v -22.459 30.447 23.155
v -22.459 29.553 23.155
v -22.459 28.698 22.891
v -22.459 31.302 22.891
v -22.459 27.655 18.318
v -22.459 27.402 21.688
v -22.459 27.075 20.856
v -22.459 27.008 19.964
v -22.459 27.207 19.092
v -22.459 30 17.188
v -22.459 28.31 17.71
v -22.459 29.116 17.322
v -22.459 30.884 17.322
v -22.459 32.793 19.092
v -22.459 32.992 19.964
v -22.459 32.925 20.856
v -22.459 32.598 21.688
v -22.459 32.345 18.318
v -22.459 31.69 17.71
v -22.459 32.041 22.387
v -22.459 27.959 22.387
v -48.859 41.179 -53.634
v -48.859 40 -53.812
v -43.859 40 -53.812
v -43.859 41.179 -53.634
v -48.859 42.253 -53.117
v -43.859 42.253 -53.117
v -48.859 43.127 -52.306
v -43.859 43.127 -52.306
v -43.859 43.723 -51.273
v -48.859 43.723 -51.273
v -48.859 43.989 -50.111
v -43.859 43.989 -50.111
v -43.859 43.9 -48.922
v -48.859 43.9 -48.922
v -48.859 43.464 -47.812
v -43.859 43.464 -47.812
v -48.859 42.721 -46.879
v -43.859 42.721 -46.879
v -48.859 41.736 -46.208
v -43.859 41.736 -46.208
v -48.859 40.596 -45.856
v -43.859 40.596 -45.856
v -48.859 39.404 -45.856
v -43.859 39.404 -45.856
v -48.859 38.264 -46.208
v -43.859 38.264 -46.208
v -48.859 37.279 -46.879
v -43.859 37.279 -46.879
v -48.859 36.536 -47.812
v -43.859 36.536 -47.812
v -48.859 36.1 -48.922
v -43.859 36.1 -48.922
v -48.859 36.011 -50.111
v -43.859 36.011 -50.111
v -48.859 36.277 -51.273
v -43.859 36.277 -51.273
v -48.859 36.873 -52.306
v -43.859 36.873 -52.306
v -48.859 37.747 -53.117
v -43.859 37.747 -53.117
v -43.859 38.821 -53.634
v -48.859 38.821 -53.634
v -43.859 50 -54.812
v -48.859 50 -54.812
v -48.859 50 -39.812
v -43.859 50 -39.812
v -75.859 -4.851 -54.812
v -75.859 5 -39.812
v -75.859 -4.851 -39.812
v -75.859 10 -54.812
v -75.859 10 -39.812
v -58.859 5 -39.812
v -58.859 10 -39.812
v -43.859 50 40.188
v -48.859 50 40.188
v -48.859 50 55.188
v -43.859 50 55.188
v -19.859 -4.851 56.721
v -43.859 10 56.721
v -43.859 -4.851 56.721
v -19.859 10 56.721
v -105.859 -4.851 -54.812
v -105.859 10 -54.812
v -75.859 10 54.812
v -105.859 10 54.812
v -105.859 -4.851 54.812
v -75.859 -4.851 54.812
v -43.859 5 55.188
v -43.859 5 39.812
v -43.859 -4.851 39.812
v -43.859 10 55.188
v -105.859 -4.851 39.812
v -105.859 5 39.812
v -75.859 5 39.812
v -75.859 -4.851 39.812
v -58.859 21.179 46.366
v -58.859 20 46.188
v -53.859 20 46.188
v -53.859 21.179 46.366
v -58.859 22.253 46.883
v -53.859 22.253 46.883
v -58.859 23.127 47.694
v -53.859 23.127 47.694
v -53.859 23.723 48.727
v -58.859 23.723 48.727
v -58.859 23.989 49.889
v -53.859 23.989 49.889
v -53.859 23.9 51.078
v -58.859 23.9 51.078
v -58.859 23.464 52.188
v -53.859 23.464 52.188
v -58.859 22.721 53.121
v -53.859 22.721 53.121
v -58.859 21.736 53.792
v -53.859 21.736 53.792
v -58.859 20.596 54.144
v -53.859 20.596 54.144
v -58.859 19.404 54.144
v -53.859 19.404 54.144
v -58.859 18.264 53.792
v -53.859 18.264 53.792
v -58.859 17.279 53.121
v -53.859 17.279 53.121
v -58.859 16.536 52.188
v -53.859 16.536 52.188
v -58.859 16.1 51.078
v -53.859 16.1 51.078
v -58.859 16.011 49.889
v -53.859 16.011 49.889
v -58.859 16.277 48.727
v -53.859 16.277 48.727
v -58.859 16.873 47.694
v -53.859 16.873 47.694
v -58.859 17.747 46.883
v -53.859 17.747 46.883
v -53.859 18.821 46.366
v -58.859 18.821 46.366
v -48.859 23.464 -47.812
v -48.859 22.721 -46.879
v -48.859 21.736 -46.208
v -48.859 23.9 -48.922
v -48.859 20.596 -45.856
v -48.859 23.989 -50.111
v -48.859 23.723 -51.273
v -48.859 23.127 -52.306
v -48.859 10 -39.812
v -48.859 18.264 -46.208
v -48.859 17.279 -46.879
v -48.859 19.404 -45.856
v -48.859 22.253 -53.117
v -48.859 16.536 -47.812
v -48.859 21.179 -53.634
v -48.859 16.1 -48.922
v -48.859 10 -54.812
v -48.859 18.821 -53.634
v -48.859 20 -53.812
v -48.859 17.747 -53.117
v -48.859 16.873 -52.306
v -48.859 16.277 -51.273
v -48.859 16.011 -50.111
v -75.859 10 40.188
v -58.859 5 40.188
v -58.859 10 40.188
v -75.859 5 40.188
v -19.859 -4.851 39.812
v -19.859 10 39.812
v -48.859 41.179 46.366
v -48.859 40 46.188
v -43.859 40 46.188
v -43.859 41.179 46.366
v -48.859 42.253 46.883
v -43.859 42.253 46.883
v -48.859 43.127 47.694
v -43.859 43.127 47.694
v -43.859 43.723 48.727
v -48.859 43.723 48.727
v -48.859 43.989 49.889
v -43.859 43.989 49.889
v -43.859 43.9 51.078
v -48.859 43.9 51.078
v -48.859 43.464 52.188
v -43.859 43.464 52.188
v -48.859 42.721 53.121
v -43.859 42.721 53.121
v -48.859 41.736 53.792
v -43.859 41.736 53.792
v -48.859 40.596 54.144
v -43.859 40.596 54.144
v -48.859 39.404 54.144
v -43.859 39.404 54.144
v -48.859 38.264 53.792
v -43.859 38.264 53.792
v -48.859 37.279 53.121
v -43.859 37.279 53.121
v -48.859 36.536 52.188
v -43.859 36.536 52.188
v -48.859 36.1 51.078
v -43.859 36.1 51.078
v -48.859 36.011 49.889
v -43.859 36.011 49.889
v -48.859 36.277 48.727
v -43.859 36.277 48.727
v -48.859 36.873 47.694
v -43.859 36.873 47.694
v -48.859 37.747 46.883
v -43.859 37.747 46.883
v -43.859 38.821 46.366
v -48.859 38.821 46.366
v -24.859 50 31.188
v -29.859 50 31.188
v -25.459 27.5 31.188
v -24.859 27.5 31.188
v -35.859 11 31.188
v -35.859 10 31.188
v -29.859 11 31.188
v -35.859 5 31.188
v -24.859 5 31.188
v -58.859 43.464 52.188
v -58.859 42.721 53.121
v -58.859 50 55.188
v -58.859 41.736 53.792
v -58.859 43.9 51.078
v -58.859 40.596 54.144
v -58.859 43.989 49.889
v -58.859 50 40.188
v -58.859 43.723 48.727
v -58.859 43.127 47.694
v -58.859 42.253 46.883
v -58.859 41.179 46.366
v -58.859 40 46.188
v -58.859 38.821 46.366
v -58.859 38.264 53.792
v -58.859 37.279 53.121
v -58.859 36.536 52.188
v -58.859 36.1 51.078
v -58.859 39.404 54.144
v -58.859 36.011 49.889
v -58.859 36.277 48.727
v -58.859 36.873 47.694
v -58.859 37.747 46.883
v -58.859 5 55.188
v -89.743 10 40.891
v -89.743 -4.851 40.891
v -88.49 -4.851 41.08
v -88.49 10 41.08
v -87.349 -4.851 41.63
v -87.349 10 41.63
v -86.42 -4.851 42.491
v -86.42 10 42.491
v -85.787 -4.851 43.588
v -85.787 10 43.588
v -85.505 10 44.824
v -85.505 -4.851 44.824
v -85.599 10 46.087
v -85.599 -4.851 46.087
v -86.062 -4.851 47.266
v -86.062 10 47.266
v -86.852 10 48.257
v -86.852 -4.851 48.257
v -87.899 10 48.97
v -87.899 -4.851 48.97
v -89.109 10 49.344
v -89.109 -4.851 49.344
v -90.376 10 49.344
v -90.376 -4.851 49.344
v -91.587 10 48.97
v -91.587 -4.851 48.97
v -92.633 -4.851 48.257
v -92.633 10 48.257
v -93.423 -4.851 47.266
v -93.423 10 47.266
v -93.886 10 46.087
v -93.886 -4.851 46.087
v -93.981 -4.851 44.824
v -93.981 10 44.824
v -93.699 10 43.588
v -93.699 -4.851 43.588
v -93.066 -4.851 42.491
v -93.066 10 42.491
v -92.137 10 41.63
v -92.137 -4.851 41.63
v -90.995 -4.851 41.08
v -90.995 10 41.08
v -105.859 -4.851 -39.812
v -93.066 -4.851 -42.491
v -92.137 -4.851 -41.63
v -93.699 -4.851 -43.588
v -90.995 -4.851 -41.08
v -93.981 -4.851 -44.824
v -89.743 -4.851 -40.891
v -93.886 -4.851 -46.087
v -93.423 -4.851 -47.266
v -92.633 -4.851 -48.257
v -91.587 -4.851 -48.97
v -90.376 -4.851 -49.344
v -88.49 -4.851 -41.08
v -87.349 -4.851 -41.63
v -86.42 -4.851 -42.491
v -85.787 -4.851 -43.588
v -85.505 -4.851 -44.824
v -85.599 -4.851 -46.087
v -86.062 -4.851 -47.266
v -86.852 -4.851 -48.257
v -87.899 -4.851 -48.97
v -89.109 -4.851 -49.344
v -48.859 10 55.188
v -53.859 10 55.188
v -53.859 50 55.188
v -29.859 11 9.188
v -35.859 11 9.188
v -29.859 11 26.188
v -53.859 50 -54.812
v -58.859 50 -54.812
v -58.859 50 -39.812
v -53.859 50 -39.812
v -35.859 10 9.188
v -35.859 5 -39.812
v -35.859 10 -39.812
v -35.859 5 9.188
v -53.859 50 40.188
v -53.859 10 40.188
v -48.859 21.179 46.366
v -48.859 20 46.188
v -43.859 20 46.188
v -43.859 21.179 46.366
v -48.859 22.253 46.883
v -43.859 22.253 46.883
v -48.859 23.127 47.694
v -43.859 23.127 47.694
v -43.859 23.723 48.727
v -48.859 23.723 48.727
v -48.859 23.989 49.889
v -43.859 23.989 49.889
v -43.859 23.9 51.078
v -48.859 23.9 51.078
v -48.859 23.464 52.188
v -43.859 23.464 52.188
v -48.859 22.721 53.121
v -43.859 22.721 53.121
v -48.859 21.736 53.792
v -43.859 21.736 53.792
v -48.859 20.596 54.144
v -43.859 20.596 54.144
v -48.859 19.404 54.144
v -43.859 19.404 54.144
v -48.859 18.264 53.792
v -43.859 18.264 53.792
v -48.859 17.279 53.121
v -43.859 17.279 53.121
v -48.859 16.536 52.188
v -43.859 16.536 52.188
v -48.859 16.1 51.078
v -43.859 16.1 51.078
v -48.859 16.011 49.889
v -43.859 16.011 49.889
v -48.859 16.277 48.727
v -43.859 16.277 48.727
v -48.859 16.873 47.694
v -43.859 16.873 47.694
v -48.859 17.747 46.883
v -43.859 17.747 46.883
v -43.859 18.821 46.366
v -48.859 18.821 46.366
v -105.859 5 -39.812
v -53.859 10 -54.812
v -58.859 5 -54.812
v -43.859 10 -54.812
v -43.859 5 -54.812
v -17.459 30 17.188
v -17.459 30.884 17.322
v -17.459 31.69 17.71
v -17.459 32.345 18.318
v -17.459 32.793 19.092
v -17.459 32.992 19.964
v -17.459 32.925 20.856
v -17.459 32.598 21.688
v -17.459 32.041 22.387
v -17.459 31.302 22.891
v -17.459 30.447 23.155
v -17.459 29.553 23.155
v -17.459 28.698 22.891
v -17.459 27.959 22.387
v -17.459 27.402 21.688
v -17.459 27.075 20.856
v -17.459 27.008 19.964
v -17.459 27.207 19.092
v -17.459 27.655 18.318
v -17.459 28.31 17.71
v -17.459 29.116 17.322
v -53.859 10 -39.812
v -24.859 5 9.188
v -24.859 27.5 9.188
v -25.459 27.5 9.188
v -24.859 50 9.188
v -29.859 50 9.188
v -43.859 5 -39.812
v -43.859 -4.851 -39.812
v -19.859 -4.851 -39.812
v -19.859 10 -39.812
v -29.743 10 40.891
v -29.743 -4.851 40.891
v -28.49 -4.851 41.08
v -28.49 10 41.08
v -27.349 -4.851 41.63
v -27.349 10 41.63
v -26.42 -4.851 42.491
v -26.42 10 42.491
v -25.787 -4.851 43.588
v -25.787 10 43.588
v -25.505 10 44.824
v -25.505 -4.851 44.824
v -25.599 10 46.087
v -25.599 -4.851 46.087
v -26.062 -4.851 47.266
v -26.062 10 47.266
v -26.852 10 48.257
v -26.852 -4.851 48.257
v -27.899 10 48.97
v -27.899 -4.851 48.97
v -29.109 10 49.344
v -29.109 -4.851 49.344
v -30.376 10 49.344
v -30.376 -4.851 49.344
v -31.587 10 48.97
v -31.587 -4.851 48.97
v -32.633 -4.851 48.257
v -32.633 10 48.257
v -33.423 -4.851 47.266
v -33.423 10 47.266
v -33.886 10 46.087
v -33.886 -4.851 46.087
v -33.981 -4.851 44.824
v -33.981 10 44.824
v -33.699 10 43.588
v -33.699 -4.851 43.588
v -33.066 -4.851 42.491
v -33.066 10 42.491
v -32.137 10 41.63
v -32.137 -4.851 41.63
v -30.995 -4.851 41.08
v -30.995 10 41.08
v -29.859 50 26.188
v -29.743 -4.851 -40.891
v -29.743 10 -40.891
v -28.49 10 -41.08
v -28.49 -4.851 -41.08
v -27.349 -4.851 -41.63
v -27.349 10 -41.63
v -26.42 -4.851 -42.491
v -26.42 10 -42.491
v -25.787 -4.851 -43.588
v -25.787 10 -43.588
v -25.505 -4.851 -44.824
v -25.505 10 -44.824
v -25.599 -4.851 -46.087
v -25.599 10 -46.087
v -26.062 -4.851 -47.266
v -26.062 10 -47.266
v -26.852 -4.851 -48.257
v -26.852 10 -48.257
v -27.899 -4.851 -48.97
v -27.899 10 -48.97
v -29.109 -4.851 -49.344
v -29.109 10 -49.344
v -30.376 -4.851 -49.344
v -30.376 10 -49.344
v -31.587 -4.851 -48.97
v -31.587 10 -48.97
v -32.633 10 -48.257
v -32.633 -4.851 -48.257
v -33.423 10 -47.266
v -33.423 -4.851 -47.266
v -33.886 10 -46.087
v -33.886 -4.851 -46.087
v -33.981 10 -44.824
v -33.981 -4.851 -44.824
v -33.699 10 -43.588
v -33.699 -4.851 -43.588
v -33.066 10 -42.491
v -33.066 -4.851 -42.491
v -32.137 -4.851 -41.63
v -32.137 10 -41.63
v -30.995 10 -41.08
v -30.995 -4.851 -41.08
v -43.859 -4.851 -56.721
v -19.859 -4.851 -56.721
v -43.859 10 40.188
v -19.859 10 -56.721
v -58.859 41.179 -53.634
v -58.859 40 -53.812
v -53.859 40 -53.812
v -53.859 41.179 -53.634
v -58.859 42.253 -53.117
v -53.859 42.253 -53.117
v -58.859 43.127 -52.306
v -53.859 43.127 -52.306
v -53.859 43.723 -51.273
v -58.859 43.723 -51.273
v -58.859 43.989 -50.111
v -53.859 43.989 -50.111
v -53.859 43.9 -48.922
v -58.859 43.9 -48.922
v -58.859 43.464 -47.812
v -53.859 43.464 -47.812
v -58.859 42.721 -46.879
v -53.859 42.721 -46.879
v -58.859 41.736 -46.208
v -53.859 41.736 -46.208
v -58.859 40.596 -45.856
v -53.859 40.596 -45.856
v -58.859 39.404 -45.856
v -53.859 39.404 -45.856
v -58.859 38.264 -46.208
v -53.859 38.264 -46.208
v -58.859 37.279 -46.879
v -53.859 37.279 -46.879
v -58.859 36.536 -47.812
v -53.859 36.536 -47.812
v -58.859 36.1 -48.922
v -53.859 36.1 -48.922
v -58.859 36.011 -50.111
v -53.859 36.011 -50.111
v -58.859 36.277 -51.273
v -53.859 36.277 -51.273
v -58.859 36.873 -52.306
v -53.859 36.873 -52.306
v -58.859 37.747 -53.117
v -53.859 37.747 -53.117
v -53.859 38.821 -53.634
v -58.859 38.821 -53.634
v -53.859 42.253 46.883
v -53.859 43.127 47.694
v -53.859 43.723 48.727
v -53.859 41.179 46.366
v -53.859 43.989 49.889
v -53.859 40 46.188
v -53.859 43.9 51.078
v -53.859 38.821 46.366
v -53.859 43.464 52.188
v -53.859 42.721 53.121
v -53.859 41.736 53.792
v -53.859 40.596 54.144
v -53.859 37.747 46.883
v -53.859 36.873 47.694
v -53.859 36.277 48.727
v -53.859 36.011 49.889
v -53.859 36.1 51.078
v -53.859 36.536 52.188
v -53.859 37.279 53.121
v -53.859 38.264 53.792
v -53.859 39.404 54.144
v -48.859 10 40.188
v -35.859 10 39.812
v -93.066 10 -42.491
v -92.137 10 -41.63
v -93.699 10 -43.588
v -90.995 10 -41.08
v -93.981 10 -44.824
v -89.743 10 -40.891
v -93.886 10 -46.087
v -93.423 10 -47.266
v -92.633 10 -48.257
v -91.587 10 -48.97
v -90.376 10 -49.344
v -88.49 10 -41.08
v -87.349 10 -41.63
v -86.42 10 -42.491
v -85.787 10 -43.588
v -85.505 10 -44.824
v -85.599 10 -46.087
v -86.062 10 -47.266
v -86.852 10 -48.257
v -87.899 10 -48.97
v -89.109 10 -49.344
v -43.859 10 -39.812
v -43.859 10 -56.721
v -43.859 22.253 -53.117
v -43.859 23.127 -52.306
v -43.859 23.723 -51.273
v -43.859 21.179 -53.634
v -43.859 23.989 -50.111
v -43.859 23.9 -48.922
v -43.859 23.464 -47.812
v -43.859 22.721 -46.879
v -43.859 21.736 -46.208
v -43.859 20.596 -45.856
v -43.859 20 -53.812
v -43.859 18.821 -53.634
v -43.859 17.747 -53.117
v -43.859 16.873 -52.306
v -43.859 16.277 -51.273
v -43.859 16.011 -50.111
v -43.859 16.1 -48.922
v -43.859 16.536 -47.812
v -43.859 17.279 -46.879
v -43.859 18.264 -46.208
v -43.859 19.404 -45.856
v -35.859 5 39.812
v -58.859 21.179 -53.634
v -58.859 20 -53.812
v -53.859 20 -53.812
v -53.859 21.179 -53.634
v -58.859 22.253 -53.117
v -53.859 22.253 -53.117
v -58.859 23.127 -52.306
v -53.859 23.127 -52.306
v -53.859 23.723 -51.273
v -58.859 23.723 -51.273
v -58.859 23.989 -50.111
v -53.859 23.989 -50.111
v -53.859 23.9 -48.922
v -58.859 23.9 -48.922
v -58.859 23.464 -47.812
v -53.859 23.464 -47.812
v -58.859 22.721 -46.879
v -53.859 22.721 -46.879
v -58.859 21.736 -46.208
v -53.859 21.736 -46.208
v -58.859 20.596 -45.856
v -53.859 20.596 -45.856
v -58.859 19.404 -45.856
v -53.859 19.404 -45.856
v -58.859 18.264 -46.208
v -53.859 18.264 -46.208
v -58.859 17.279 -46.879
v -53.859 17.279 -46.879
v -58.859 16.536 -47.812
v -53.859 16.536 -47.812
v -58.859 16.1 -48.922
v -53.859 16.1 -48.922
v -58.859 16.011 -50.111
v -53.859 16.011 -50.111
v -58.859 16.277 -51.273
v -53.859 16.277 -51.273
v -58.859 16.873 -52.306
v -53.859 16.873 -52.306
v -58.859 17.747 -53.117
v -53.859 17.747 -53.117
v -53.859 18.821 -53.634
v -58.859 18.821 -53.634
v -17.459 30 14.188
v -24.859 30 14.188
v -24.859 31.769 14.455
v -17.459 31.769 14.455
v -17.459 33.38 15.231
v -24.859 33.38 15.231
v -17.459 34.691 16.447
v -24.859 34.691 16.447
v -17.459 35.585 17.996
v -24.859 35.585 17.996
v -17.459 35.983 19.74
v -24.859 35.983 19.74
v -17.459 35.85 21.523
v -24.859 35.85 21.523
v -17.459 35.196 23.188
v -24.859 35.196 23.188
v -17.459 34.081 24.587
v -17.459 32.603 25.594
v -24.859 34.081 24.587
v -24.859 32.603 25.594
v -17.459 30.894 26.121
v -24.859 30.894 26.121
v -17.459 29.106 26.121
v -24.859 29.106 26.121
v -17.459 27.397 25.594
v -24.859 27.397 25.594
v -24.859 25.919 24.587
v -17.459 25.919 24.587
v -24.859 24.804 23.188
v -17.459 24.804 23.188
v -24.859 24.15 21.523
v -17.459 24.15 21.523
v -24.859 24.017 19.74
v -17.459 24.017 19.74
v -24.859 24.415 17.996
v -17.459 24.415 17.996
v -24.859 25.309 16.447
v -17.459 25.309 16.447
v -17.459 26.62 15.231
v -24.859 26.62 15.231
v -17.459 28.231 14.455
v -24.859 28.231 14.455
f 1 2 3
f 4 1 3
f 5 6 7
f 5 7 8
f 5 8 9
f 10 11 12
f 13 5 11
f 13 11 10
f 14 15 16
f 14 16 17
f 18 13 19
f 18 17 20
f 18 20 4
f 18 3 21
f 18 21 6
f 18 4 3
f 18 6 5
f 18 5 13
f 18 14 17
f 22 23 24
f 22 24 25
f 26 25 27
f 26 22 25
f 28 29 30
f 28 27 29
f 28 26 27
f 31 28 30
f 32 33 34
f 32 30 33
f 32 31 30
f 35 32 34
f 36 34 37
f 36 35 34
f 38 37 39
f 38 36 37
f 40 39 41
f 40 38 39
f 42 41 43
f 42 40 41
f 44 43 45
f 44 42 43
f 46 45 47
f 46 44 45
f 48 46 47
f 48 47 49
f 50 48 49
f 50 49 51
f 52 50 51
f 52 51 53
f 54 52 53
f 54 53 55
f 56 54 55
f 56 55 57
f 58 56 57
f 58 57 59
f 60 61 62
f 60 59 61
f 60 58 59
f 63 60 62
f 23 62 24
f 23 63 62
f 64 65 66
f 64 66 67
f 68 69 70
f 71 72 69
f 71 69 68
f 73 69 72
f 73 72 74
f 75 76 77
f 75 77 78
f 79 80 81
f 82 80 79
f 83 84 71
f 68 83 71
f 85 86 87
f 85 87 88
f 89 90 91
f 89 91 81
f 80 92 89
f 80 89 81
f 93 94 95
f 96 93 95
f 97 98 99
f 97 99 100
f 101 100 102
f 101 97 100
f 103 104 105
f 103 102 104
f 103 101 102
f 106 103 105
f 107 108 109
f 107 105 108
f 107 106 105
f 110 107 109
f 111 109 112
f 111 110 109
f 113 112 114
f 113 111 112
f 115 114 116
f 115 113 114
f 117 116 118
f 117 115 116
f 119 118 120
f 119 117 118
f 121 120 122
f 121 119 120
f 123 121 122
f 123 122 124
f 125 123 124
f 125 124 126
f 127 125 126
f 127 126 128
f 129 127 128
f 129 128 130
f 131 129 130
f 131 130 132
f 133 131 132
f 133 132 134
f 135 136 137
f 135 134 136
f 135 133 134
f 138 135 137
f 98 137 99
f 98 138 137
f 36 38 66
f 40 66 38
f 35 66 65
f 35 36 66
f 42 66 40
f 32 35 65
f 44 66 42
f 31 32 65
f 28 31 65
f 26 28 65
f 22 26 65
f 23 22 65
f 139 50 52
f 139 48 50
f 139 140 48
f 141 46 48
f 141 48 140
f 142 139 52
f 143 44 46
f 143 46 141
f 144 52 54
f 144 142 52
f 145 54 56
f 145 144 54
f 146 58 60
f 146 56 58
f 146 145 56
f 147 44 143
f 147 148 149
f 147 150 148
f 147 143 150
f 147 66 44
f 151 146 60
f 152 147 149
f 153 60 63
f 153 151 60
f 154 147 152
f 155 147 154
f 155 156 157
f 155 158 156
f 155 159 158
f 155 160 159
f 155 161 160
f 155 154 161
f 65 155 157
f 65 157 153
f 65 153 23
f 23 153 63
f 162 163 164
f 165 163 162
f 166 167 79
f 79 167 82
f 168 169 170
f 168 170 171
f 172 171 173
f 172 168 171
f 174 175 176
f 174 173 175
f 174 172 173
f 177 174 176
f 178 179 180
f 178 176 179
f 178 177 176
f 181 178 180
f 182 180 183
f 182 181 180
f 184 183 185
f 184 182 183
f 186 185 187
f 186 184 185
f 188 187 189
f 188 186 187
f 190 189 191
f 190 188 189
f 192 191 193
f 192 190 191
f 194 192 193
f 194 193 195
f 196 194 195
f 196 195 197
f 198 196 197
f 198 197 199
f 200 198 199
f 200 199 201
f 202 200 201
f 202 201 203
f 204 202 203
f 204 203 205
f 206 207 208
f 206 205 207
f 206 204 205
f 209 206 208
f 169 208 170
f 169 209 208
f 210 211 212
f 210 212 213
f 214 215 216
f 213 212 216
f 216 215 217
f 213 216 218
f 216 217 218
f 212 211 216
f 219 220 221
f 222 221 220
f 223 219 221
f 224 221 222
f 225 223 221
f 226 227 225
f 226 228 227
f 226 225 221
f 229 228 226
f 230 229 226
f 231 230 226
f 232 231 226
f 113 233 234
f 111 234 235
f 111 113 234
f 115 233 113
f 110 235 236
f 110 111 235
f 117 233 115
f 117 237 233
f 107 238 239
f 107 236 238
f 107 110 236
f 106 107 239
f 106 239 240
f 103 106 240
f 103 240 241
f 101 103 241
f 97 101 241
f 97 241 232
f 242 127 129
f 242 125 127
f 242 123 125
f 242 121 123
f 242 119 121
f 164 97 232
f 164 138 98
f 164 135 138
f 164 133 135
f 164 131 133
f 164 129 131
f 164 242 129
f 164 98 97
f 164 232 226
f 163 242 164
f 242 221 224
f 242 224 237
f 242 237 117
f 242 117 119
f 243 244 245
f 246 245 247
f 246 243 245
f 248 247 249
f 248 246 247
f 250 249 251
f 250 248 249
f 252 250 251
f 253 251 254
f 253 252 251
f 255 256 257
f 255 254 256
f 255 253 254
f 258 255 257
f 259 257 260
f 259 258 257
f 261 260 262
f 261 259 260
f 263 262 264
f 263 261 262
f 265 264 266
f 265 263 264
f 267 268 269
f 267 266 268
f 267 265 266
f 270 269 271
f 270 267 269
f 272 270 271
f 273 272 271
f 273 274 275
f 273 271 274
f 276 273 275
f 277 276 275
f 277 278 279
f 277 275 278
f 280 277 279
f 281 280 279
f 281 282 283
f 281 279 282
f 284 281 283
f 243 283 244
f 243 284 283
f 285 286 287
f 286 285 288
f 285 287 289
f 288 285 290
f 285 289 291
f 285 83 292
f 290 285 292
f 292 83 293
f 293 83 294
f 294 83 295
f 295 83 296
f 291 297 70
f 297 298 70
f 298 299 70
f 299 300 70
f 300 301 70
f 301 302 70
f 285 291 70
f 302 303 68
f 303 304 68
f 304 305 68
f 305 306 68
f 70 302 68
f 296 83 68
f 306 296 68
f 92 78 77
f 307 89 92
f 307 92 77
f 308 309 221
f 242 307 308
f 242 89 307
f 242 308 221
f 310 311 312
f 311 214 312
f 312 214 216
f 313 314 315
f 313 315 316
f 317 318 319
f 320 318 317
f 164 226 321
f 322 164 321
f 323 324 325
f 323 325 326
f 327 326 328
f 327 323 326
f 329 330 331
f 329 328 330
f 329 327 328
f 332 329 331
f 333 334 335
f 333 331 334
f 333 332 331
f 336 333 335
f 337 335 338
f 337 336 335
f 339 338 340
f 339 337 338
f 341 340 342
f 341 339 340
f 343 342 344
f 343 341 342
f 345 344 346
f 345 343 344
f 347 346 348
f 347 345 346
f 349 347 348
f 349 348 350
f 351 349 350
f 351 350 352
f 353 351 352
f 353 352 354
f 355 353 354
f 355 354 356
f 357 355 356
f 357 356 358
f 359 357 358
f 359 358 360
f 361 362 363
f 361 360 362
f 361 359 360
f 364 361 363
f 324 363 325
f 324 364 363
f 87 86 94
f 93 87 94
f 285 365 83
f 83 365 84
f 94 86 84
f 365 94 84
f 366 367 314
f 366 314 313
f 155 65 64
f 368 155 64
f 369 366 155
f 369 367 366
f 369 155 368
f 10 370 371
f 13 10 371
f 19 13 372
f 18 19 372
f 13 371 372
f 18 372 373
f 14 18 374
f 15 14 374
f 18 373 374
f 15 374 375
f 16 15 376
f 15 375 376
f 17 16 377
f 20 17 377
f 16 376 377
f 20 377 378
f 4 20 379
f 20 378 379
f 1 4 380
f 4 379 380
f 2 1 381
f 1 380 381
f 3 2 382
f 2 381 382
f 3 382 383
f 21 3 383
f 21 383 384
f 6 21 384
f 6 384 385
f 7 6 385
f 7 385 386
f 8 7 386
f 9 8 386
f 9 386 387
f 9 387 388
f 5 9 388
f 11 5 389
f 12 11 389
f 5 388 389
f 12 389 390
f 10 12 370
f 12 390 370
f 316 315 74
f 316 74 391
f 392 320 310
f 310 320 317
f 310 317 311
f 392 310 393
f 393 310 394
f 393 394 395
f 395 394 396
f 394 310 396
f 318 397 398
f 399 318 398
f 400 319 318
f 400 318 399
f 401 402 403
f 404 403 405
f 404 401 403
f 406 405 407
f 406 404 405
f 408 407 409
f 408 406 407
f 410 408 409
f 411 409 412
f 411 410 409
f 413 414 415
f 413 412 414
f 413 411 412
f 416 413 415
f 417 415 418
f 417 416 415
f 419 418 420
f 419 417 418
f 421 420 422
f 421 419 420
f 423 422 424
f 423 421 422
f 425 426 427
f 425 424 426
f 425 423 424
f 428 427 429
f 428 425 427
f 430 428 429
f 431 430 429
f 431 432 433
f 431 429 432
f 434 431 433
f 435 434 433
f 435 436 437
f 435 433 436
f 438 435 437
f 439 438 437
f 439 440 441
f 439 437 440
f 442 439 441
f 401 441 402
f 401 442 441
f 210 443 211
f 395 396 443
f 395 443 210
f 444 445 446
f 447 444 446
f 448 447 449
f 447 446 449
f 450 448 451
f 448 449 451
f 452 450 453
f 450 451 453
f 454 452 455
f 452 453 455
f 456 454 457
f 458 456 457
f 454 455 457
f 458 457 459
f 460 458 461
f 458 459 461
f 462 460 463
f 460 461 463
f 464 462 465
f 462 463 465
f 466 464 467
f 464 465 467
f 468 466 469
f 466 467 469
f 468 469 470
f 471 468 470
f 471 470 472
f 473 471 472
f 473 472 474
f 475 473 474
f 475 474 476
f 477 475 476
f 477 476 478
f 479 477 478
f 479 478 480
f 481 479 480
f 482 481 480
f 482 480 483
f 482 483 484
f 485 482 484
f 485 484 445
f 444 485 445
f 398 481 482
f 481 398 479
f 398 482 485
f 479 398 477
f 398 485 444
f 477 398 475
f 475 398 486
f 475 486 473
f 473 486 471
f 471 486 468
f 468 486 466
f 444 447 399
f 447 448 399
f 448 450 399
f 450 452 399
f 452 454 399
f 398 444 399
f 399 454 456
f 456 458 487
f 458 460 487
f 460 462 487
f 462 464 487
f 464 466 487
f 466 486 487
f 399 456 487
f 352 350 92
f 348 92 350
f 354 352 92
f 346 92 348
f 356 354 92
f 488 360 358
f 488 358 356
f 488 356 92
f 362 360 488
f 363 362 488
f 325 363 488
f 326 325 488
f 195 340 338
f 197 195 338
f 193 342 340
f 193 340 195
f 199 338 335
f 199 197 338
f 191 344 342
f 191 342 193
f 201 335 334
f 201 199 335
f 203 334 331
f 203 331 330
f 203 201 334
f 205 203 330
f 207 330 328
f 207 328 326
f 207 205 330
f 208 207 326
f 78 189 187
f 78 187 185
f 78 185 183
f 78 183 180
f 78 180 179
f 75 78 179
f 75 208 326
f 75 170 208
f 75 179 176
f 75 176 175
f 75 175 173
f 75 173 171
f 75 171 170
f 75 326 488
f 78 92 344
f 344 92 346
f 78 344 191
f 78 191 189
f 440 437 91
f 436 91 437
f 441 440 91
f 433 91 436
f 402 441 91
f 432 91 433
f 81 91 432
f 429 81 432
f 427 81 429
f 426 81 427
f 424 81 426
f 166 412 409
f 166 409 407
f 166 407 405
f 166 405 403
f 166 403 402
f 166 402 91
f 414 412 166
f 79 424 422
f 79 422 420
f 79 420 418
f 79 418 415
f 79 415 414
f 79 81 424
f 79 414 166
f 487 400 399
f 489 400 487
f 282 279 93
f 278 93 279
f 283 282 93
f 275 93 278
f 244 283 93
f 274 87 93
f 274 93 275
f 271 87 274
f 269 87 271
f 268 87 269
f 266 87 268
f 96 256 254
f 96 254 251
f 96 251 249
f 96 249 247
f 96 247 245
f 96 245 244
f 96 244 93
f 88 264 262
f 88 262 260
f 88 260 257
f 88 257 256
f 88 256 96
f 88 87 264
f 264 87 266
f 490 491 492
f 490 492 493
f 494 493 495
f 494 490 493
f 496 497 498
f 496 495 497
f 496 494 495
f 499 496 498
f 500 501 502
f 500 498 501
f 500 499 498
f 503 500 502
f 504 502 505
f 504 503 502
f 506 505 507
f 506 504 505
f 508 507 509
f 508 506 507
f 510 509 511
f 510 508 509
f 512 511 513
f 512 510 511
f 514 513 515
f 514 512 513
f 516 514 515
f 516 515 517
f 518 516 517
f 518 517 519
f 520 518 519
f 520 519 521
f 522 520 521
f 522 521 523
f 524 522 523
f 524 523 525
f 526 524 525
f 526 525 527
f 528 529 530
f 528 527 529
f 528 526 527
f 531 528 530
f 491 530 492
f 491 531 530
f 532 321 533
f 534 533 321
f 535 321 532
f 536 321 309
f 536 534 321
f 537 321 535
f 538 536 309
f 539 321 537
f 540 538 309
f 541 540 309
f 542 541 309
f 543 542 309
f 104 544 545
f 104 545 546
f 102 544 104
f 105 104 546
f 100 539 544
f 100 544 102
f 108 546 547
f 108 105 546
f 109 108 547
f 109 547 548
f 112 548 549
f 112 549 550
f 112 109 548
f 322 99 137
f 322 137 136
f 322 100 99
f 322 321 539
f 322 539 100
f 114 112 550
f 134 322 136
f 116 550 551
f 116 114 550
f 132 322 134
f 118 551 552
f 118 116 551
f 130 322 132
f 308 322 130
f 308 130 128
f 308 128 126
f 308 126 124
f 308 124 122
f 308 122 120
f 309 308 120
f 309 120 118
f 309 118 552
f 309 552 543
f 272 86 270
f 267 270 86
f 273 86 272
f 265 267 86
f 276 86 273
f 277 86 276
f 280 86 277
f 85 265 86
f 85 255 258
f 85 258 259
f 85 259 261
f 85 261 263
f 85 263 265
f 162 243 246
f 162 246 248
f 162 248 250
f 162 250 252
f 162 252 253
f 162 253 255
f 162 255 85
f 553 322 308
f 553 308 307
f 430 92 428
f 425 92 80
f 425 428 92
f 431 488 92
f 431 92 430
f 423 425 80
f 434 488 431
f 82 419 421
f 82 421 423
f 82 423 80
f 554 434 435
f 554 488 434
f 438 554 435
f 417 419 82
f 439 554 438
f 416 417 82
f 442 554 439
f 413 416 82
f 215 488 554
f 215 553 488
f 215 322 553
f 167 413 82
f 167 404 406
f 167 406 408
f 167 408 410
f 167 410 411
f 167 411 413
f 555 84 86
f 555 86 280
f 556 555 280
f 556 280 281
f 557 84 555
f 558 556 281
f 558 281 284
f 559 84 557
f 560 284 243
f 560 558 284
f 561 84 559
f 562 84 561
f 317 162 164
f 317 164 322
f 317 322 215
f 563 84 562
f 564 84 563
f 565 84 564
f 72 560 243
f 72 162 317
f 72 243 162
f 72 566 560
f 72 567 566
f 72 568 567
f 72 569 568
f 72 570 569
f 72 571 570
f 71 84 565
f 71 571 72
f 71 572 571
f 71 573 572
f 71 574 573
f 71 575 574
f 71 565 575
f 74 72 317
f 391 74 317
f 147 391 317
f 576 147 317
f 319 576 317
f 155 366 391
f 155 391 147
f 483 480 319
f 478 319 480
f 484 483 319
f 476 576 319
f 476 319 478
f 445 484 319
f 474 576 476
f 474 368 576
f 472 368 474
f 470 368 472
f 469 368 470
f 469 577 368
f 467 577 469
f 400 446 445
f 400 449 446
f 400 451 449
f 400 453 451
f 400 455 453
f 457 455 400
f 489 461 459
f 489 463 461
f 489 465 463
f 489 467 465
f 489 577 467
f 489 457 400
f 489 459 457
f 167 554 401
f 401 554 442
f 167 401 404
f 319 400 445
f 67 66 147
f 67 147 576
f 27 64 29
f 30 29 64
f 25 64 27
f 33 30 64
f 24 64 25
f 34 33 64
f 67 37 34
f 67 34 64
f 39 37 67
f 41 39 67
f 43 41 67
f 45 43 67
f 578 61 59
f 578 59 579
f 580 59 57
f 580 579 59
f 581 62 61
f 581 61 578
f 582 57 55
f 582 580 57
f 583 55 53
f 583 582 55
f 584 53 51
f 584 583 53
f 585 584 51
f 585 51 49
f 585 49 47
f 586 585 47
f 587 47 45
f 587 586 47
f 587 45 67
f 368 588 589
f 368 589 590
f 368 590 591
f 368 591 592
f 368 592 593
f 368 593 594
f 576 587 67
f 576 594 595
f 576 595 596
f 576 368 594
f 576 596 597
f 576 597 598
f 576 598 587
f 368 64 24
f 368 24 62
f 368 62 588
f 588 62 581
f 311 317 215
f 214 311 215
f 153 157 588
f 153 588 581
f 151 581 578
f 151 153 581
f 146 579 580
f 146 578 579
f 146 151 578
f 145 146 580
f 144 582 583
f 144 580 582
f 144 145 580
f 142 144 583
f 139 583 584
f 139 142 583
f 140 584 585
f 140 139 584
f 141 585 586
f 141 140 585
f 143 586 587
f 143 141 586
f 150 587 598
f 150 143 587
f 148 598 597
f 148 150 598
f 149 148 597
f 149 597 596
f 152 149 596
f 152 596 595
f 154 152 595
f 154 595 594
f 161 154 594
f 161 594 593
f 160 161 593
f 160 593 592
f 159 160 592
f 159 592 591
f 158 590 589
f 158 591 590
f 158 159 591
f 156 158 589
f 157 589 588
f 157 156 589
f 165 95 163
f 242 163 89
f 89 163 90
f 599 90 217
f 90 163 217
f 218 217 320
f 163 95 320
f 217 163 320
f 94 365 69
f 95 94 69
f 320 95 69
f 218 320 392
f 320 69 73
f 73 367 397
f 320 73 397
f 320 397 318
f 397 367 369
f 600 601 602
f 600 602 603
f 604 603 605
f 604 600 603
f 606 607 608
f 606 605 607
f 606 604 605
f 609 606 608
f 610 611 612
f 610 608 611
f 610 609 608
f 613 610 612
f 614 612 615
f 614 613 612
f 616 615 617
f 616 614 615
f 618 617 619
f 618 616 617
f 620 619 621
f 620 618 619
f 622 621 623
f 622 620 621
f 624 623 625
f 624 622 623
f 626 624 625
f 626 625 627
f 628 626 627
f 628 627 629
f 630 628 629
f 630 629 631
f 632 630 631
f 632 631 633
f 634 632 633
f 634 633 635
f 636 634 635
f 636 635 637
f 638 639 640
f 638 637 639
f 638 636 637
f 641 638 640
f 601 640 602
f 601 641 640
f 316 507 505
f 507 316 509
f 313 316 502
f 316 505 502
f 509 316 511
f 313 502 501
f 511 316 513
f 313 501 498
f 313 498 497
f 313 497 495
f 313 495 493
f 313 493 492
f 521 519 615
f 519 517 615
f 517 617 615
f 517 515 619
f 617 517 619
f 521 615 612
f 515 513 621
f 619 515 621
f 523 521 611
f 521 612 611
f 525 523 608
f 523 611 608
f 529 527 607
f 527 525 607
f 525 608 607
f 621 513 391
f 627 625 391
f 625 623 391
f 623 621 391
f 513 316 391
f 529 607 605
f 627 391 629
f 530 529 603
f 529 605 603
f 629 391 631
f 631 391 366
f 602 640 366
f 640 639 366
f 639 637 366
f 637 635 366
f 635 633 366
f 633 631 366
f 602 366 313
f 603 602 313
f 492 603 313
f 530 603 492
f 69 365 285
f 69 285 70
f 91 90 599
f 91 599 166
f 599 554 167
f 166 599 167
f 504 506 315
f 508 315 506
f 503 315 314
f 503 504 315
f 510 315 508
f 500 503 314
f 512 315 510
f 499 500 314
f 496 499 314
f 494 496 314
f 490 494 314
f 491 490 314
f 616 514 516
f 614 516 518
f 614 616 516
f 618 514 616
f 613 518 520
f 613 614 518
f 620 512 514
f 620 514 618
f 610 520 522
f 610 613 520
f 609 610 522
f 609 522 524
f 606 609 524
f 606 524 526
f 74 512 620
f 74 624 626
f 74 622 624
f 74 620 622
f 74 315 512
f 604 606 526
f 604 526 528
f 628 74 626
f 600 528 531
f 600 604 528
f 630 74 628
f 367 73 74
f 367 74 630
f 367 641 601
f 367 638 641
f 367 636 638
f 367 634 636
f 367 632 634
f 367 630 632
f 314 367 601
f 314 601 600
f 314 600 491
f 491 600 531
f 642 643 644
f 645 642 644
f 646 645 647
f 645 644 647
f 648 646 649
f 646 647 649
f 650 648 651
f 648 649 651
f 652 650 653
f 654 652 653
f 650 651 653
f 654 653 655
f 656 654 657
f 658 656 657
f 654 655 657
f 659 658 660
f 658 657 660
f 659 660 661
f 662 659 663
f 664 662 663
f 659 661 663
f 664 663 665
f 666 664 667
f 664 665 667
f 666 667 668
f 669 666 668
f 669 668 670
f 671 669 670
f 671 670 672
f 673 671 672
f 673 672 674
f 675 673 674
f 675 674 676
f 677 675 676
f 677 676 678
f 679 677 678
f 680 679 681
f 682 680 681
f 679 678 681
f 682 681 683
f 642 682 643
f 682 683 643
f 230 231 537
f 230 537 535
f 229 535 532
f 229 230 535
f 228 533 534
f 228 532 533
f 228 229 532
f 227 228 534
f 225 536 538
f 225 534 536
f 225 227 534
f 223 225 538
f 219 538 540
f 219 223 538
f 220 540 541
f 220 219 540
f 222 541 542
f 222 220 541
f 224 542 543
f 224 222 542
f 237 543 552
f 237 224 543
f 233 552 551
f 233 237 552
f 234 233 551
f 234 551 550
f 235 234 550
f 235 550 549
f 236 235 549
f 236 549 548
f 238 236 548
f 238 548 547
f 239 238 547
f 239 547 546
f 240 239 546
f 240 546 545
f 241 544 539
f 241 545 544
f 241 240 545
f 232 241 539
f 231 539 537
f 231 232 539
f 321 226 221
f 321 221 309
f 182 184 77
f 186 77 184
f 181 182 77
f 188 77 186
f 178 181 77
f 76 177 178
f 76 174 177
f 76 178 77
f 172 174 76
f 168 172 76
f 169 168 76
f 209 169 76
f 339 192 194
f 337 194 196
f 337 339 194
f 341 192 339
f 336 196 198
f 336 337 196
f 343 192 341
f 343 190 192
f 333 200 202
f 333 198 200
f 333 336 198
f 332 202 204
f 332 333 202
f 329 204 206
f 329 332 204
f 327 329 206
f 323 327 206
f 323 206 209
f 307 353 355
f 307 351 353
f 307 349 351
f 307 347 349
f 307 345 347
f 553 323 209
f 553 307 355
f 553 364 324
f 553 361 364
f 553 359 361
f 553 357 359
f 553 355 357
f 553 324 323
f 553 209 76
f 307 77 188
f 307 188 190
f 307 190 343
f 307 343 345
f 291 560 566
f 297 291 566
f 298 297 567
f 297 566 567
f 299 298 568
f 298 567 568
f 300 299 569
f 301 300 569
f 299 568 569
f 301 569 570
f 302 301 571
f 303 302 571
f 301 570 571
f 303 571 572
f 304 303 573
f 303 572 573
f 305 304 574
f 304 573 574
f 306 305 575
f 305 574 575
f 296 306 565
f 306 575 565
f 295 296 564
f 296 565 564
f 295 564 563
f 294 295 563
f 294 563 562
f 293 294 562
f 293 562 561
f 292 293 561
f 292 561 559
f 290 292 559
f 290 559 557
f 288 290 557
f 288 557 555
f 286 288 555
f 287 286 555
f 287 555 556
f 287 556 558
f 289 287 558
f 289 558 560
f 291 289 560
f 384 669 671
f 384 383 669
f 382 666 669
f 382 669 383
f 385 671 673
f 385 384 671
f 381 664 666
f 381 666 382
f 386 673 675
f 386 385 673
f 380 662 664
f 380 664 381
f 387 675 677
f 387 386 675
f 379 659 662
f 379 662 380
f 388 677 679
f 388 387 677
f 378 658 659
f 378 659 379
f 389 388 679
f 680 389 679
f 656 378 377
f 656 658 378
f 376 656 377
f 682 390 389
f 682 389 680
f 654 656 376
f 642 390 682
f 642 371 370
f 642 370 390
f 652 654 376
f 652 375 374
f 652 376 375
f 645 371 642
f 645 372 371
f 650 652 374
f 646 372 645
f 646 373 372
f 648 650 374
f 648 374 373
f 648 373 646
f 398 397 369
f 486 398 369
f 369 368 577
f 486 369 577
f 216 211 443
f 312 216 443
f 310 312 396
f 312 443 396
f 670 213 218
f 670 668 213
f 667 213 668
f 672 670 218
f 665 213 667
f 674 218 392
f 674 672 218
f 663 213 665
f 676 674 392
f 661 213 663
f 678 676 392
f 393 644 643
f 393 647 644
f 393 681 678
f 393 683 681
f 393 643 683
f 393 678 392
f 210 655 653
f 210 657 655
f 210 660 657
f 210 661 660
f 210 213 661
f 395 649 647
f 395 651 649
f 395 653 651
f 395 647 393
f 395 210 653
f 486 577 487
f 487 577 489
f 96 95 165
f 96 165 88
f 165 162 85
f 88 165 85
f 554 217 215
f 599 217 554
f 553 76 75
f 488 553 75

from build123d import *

# Parameters (mm, degrees)
SKETCH_1_W                = 211.717851242
SKETCH_1_H                = 121.662509304
EXTRUDE_1_DEPTH           = 10
SKETCH_2_W                = 5
SKETCH_2_H                = 15
EXTRUDE_2_DEPTH           = 40
CUT_EXTRUDE_1_DEPTH       = 129.477833404
CUT_EXTRUDE_1_DEPTH_BACK  = 129.477833404
SKETCH_3_OUTSIDE_W        = 263.568
SKETCH_3_OUTSIDE_H        = 173.512
SKETCH_4_W                = 15
SKETCH_4_H                = 15
EXTRUDE_3_DEPTH           = 10
CUT_EXTRUDE_2_DEPTH       = 130.428976448
CUT_EXTRUDE_2_DEPTH_BACK  = 5
SKETCH_5_W                = 251.048169007
SKETCH_5_H                = 208.83861988
CUT_EXTRUDE_3_DEPTH       = 97.900711095
CUT_EXTRUDE_3_DEPTH_BACK  = 97.900711095
SKETCH_7_R                = 4
SKETCH_8_W                = 6
SKETCH_8_H                = 22
EXTRUDE_6_DEPTH           = 6
CUT_EXTRUDE_4_DEPTH       = 128.58079771
CUT_EXTRUDE_4_DEPTH_BACK  = 128.58079771
SKETCH_10_W               = 17
SKETCH_10_H               = 6
EXTRUDE_7_DEPTH           = 5
SKETCH_11_R               = 11
EXTRUDE_8_DEPTH           = 0.6
SKETCH_12_R               = 6
EXTRUDE_9_DEPTH           = 7.4
CUT_EXTRUDE_10_DEPTH      = 116.586797735
CUT_EXTRUDE_10_DEPTH_BACK = 3
SKETCH_13_R               = 3
EXTRUDE_10_DEPTH          = 45
SKETCH_15_R               = 9.319080667
CUT_EXTRUDE_11_DEPTH      = 38
SKETCH_16_R               = 6
EXTRUDE_11_DEPTH          = 7.4
SKETCH_17_R               = 3
CUT_EXTRUDE_12_DEPTH      = 5
SKETCH_18_W               = 30
SKETCH_18_H               = 15
EXTRUDE_12_DEPTH          = 14.850514471
EXTRUDE_13_DEPTH          = 14.850514471
SKETCH_22_W               = 24
SKETCH_22_H               = 16.908951495
EXTRUDE_14_DEPTH          = 14.850514471
SKETCH_23_R               = 4.25
CUT_EXTRUDE_15_DEPTH      = 60
EXTRUDE_15_DEPTH          = 14.850514471
SKETCH_25_R               = 4.25
CUT_EXTRUDE_16_DEPTH      = 60
SKETCH_19_R               = 4.25
CUT_EXTRUDE_17_DEPTH      = 60
SKETCH_26_W               = 38.044769018
SKETCH_26_H               = 21.34609726
SKETCH_26_W_2             = 24.699869201
SKETCH_26_H_2             = 16.908951494
CUT_EXTRUDE_18_DEPTH      = 60
SKETCH_27_W               = 6.321147669
SKETCH_27_H               = 14.747228213
CUT_EXTRUDE_19_DEPTH      = 39


with BuildPart() as part:
    # 草图1 → 凸台-拉伸1 (new body)
    with BuildSketch(Plane(origin=(0, 0, 0), x_dir=(1, 0, 0), z_dir=(0, 1, 0))):
        Rectangle(SKETCH_1_W, SKETCH_1_H)
    extrude(amount=EXTRUDE_1_DEPTH)

    # 草图2 → 凸台-拉伸2 (add)
    with BuildSketch(Plane(origin=(0, 10, 0), x_dir=(1, 0, 0), z_dir=(0, 1, 0))):
        with Locations((-46.358925621, 47.311705854)):
            Rectangle(SKETCH_2_W, SKETCH_2_H)
        with Locations((-56.358925621, 47.311705854)):
            Rectangle(SKETCH_2_W, SKETCH_2_H)
        with Locations((-46.358925621, -47.688294146)):
            Rectangle(SKETCH_2_W, SKETCH_2_H)
        with Locations((-56.358925621, -47.688294146)):
            Rectangle(SKETCH_2_W, SKETCH_2_H)
    extrude(amount=EXTRUDE_2_DEPTH)

    # 草图3 outside → 切除-拉伸1 (cut, two sides: drawn at the far end of the back side and taken through both)
    with BuildSketch(Plane(origin=(0, 10, 0), x_dir=(1, 0, 0), z_dir=(0, 1, 0)).offset(-CUT_EXTRUDE_1_DEPTH_BACK)):
        Rectangle(SKETCH_3_OUTSIDE_W, SKETCH_3_OUTSIDE_H)
        Polygon((-105.858925621, 39.811705854), (-58.858925621, 39.811705854), (-58.858925621, 54.811705854), (-43.858925621, 54.811705854), (-43.858925621, 39.811705854), (-35.858925621, 39.811705854), (-35.858925621, -40.188294146), (-43.858925621, -40.188294146), (-43.858925621, -55.188294146), (-48.858925621, -55.188294146), (-48.858925621, -40.188294146), (-53.858925621, -40.188294146), (-53.858925621, -55.188294146), (-58.858925621, -55.188294146), (-58.858925621, -40.188294146), (-106.714815402, -40.188294146), align=None, mode=Mode.SUBTRACT)
    extrude(amount=CUT_EXTRUDE_1_DEPTH + CUT_EXTRUDE_1_DEPTH_BACK, mode=Mode.SUBTRACT)

    # 草图4 → 凸台-拉伸3 (add)
    with BuildSketch(Plane.XZ):
        with Locations((-51.358925621, 47.688294146)):
            Rectangle(SKETCH_4_W, SKETCH_4_H)
    extrude(amount=-EXTRUDE_3_DEPTH)

    # 草图5 → 切除-拉伸2 (cut, two sides: drawn at the far end of the back side and taken through both)
    with BuildSketch(Plane.XZ.offset(-CUT_EXTRUDE_2_DEPTH_BACK)):
        with Locations((-99.962010128, 39.987109066)):
            Rectangle(SKETCH_5_W, SKETCH_5_H)
    extrude(amount=CUT_EXTRUDE_2_DEPTH + CUT_EXTRUDE_2_DEPTH_BACK, mode=Mode.SUBTRACT)

    # 草图7 → 切除-拉伸3 (cut, two sides: drawn at the far end of the back side and taken through both)
    with BuildSketch(Plane(origin=(-43.858925621, 0, 0), x_dir=(0, 0, -1), z_dir=(1, 0, 0)).offset(-CUT_EXTRUDE_3_DEPTH_BACK)):
        with Locations((-50.188294146, 40)):
            Circle(SKETCH_7_R)
        with Locations((-50.188294146, 20)):
            Circle(SKETCH_7_R)
        with Locations((49.811705854, 40)):
            Circle(SKETCH_7_R)
        with Locations((49.811705854, 20)):
            Circle(SKETCH_7_R)
    extrude(amount=CUT_EXTRUDE_3_DEPTH + CUT_EXTRUDE_3_DEPTH_BACK, mode=Mode.SUBTRACT)

    # 草图8 → 凸台-拉伸6 (add)
    with BuildSketch(Plane.XZ.offset(-5)):
        with Locations((-32.858925621, 20.188294146)):
            Rectangle(SKETCH_8_W, SKETCH_8_H)
    extrude(amount=-EXTRUDE_6_DEPTH)

    # 草图9 → 切除-拉伸4 (cut, two sides: drawn at the far end of the back side and taken through both)
    with BuildSketch(Plane.XZ.offset(-5).offset(-CUT_EXTRUDE_4_DEPTH_BACK)):
        Polygon((-34.858925621, 39.188294146), (-34.858925621, 31.188294146), (-29.207793941, 25.537162465), (-29.207793941, 39.188294146), align=None)
    extrude(amount=CUT_EXTRUDE_4_DEPTH + CUT_EXTRUDE_4_DEPTH_BACK, mode=Mode.SUBTRACT)

    # 草图10 → 凸台-拉伸7 (add)
    with BuildSketch(Plane(origin=(-29.858925621, 0, 0), x_dir=(0, 0, -1), z_dir=(1, 0, 0))):
        Polygon((-31.188294146, 5), (-26.188294146, 5), (-26.188294146, 11), (-9.188294146, 11), (-9.188294146, 50), (-31.188294146, 50), align=None)
        with Locations((-17.688294146, 8)):
            Rectangle(SKETCH_10_W, SKETCH_10_H)
    extrude(amount=EXTRUDE_7_DEPTH)

    # 草图11 → 凸台-拉伸8 (add)
    with BuildSketch(Plane(origin=(-24.858925621, 0, 0), x_dir=(0, 0, -1), z_dir=(1, 0, 0))):
        with Locations((-20.188294146, 27.5)):
            Circle(SKETCH_11_R)
    extrude(amount=-EXTRUDE_8_DEPTH)

    # 草图12 → 凸台-拉伸9 (add)
    with BuildSketch(Plane(origin=(-24.858925621, 0, 0), x_dir=(0, 0, -1), z_dir=(1, 0, 0))):
        with Locations((-20.188294146, 27.5)):
            Circle(SKETCH_12_R)
    extrude(amount=EXTRUDE_9_DEPTH)

    # 草图13 → 切除-拉伸10 (cut, two sides: drawn at the far end of the back side and taken through both)
    with BuildSketch(Plane(origin=(-17.458925621, 0, 0), x_dir=(0, 0, -1), z_dir=(1, 0, 0)).offset(-CUT_EXTRUDE_10_DEPTH_BACK)):
        with Locations(Location((-20.188294146, 27.5, 0), (0, 0, 180))):
            Circle(SKETCH_13_R)
    extrude(amount=CUT_EXTRUDE_10_DEPTH + CUT_EXTRUDE_10_DEPTH_BACK, mode=Mode.SUBTRACT)

    # 草图14 → 凸台-拉伸10 (add)
    with BuildSketch(Plane(origin=(0, 5, 0), x_dir=(-1, 0, 0), z_dir=(0, -1, 0))):
        Polygon((34.858925621, -31.188294146), (29.858925621, -31.188294146), (29.858925621, -26.188294146), align=None)
    extrude(amount=-EXTRUDE_10_DEPTH)

    # 草图15 → 切除-拉伸11 (cut)
    with BuildSketch(Plane(origin=(-24.858925621, 0, 0), x_dir=(0, 0, -1), z_dir=(1, 0, 0))):
        with Locations((-20.188294146, 27.5)):
            Circle(SKETCH_15_R)
    extrude(amount=CUT_EXTRUDE_11_DEPTH, mode=Mode.SUBTRACT)

    # 草图16 → 凸台-拉伸11 (add)
    with BuildSketch(Plane(origin=(-24.858925621, 0, 0), x_dir=(0, 0, -1), z_dir=(1, 0, 0))):
        with Locations((-20.188294146, 30)):
            Circle(SKETCH_16_R)
    extrude(amount=EXTRUDE_11_DEPTH)

    # 草图17 → 切除-拉伸12 (cut)
    with BuildSketch(Plane(origin=(-17.458925621, 0, 0), x_dir=(0, 0, -1), z_dir=(1, 0, 0))):
        with Locations((-20.188294146, 30)):
            Circle(SKETCH_17_R)
    extrude(amount=-CUT_EXTRUDE_12_DEPTH, mode=Mode.SUBTRACT)

    # 草图18 → 凸台-拉伸12 (add)
    with BuildSketch(Plane(origin=(0, 10, 0), x_dir=(1, 0, 0), z_dir=(0, 1, 0))):
        with Locations((-90.858925621, 47.311705854)):
            Rectangle(SKETCH_18_W, SKETCH_18_H)
    extrude_12 = extrude(amount=-EXTRUDE_12_DEPTH)

    # 草图22 → 凸台-拉伸14 (add)
    with BuildSketch(Plane(origin=(0, 10, 0), x_dir=(1, 0, 0), z_dir=(0, 1, 0))):
        with Locations((-31.858925621, 48.266181602)):
            Rectangle(SKETCH_22_W, SKETCH_22_H)
    extrude_14 = extrude(amount=-EXTRUDE_14_DEPTH)

    # 草图23 → 切除-拉伸15 (cut)
    with BuildSketch(Plane(origin=(0, 10, 0), x_dir=(1, 0, 0), z_dir=(0, 1, 0))):
        with Locations(Location((-29.74274895, 45.141181602, 0), (0, 0, 270))):
            Circle(SKETCH_23_R)
    cut_extrude_15 = extrude(amount=-CUT_EXTRUDE_15_DEPTH, mode=Mode.SUBTRACT)

    # 草图24 → 凸台-拉伸15 (add)
    with BuildSketch(Plane(origin=(0, -4.850514471, 0), x_dir=(1, 0, 0), z_dir=(0, 1, 0))):
        Polygon((-43.858925621, -40.188294146), (-43.858925621, -57.09724564), (-19.74274895, -40.233286806), (-19.74274895, -40.188294146), align=None)
    extrude(amount=EXTRUDE_15_DEPTH)

    # 草图25 → 切除-拉伸16 (cut)
    with BuildSketch(Plane(origin=(0, 10, 0), x_dir=(1, 0, 0), z_dir=(0, 1, 0))):
        with Locations((-29.74274895, -45.517769893)):
            Circle(SKETCH_25_R)
    extrude(amount=-CUT_EXTRUDE_16_DEPTH, mode=Mode.SUBTRACT)

    # 草图19 → 切除-拉伸17 (cut)
    with BuildSketch(Plane(origin=(0, 10, 0), x_dir=(1, 0, 0), z_dir=(0, 1, 0))):
        with Locations(Location((-89.74274895, 45.141181602, 0), (0, 0, 270))):
            Circle(SKETCH_19_R)
    cut_extrude_17 = extrude(amount=-CUT_EXTRUDE_17_DEPTH, mode=Mode.SUBTRACT)


with BuildPart() as body_2:
    # 草图20 → 凸台-拉伸13 (new body)
    with BuildSketch(Plane(origin=(0, 10, 0), x_dir=(1, 0, 0), z_dir=(0, 1, 0))):
        Polygon((-105.858925621, -40.188294146), (-74.74274895, -56.834668943), (-74.74274895, -57.09724564), (-105.858925621, -57.09724564), align=None)
    extrude(amount=-EXTRUDE_13_DEPTH)


with BuildPart() as cut_extrude_18_tool:
    # 草图26 → 切除-拉伸18 (new body)
    with BuildSketch(Plane(origin=(0, 10, 0), x_dir=(1, 0, 0), z_dir=(0, 1, 0))):
        with Locations((-86.836541112, -50.861342776)):
            Rectangle(SKETCH_26_W, SKETCH_26_H)
        with Locations((-31.508991021, -48.642769893)):
            Rectangle(SKETCH_26_W_2, SKETCH_26_H_2)
    extrude(amount=-CUT_EXTRUDE_18_DEPTH)


with BuildPart() as part_1:
    add(part.part)

    # 切除-拉伸18: cut by cut_extrude_18_tool
    add(cut_extrude_18_tool.part, mode=Mode.SUBTRACT)

    # 镜向1: 凸台-拉伸12, 凸台-拉伸14, 切除-拉伸15, 切除-拉伸17 across plane
    add(extrude_12.mirror(Plane.XY))
    add(extrude_14.mirror(Plane.XY))
    add(cut_extrude_15.mirror(Plane.XY), mode=Mode.SUBTRACT)
    add(cut_extrude_17.mirror(Plane.XY), mode=Mode.SUBTRACT)

    # 草图27 → 切除-拉伸19 (cut)
    with BuildSketch(Plane(origin=(0, 50, 0), x_dir=(1, 0, 0), z_dir=(0, 1, 0))):
        with Locations((-33.019499456, -25.654978199)):
            Rectangle(SKETCH_27_W, SKETCH_27_H)
    extrude(amount=-CUT_EXTRUDE_19_DEPTH, mode=Mode.SUBTRACT)


with BuildPart() as body_2_1:
    add(body_2.part)

    # 切除-拉伸18: cut by cut_extrude_18_tool
    add(cut_extrude_18_tool.part, mode=Mode.SUBTRACT)


solid = part_1.part
